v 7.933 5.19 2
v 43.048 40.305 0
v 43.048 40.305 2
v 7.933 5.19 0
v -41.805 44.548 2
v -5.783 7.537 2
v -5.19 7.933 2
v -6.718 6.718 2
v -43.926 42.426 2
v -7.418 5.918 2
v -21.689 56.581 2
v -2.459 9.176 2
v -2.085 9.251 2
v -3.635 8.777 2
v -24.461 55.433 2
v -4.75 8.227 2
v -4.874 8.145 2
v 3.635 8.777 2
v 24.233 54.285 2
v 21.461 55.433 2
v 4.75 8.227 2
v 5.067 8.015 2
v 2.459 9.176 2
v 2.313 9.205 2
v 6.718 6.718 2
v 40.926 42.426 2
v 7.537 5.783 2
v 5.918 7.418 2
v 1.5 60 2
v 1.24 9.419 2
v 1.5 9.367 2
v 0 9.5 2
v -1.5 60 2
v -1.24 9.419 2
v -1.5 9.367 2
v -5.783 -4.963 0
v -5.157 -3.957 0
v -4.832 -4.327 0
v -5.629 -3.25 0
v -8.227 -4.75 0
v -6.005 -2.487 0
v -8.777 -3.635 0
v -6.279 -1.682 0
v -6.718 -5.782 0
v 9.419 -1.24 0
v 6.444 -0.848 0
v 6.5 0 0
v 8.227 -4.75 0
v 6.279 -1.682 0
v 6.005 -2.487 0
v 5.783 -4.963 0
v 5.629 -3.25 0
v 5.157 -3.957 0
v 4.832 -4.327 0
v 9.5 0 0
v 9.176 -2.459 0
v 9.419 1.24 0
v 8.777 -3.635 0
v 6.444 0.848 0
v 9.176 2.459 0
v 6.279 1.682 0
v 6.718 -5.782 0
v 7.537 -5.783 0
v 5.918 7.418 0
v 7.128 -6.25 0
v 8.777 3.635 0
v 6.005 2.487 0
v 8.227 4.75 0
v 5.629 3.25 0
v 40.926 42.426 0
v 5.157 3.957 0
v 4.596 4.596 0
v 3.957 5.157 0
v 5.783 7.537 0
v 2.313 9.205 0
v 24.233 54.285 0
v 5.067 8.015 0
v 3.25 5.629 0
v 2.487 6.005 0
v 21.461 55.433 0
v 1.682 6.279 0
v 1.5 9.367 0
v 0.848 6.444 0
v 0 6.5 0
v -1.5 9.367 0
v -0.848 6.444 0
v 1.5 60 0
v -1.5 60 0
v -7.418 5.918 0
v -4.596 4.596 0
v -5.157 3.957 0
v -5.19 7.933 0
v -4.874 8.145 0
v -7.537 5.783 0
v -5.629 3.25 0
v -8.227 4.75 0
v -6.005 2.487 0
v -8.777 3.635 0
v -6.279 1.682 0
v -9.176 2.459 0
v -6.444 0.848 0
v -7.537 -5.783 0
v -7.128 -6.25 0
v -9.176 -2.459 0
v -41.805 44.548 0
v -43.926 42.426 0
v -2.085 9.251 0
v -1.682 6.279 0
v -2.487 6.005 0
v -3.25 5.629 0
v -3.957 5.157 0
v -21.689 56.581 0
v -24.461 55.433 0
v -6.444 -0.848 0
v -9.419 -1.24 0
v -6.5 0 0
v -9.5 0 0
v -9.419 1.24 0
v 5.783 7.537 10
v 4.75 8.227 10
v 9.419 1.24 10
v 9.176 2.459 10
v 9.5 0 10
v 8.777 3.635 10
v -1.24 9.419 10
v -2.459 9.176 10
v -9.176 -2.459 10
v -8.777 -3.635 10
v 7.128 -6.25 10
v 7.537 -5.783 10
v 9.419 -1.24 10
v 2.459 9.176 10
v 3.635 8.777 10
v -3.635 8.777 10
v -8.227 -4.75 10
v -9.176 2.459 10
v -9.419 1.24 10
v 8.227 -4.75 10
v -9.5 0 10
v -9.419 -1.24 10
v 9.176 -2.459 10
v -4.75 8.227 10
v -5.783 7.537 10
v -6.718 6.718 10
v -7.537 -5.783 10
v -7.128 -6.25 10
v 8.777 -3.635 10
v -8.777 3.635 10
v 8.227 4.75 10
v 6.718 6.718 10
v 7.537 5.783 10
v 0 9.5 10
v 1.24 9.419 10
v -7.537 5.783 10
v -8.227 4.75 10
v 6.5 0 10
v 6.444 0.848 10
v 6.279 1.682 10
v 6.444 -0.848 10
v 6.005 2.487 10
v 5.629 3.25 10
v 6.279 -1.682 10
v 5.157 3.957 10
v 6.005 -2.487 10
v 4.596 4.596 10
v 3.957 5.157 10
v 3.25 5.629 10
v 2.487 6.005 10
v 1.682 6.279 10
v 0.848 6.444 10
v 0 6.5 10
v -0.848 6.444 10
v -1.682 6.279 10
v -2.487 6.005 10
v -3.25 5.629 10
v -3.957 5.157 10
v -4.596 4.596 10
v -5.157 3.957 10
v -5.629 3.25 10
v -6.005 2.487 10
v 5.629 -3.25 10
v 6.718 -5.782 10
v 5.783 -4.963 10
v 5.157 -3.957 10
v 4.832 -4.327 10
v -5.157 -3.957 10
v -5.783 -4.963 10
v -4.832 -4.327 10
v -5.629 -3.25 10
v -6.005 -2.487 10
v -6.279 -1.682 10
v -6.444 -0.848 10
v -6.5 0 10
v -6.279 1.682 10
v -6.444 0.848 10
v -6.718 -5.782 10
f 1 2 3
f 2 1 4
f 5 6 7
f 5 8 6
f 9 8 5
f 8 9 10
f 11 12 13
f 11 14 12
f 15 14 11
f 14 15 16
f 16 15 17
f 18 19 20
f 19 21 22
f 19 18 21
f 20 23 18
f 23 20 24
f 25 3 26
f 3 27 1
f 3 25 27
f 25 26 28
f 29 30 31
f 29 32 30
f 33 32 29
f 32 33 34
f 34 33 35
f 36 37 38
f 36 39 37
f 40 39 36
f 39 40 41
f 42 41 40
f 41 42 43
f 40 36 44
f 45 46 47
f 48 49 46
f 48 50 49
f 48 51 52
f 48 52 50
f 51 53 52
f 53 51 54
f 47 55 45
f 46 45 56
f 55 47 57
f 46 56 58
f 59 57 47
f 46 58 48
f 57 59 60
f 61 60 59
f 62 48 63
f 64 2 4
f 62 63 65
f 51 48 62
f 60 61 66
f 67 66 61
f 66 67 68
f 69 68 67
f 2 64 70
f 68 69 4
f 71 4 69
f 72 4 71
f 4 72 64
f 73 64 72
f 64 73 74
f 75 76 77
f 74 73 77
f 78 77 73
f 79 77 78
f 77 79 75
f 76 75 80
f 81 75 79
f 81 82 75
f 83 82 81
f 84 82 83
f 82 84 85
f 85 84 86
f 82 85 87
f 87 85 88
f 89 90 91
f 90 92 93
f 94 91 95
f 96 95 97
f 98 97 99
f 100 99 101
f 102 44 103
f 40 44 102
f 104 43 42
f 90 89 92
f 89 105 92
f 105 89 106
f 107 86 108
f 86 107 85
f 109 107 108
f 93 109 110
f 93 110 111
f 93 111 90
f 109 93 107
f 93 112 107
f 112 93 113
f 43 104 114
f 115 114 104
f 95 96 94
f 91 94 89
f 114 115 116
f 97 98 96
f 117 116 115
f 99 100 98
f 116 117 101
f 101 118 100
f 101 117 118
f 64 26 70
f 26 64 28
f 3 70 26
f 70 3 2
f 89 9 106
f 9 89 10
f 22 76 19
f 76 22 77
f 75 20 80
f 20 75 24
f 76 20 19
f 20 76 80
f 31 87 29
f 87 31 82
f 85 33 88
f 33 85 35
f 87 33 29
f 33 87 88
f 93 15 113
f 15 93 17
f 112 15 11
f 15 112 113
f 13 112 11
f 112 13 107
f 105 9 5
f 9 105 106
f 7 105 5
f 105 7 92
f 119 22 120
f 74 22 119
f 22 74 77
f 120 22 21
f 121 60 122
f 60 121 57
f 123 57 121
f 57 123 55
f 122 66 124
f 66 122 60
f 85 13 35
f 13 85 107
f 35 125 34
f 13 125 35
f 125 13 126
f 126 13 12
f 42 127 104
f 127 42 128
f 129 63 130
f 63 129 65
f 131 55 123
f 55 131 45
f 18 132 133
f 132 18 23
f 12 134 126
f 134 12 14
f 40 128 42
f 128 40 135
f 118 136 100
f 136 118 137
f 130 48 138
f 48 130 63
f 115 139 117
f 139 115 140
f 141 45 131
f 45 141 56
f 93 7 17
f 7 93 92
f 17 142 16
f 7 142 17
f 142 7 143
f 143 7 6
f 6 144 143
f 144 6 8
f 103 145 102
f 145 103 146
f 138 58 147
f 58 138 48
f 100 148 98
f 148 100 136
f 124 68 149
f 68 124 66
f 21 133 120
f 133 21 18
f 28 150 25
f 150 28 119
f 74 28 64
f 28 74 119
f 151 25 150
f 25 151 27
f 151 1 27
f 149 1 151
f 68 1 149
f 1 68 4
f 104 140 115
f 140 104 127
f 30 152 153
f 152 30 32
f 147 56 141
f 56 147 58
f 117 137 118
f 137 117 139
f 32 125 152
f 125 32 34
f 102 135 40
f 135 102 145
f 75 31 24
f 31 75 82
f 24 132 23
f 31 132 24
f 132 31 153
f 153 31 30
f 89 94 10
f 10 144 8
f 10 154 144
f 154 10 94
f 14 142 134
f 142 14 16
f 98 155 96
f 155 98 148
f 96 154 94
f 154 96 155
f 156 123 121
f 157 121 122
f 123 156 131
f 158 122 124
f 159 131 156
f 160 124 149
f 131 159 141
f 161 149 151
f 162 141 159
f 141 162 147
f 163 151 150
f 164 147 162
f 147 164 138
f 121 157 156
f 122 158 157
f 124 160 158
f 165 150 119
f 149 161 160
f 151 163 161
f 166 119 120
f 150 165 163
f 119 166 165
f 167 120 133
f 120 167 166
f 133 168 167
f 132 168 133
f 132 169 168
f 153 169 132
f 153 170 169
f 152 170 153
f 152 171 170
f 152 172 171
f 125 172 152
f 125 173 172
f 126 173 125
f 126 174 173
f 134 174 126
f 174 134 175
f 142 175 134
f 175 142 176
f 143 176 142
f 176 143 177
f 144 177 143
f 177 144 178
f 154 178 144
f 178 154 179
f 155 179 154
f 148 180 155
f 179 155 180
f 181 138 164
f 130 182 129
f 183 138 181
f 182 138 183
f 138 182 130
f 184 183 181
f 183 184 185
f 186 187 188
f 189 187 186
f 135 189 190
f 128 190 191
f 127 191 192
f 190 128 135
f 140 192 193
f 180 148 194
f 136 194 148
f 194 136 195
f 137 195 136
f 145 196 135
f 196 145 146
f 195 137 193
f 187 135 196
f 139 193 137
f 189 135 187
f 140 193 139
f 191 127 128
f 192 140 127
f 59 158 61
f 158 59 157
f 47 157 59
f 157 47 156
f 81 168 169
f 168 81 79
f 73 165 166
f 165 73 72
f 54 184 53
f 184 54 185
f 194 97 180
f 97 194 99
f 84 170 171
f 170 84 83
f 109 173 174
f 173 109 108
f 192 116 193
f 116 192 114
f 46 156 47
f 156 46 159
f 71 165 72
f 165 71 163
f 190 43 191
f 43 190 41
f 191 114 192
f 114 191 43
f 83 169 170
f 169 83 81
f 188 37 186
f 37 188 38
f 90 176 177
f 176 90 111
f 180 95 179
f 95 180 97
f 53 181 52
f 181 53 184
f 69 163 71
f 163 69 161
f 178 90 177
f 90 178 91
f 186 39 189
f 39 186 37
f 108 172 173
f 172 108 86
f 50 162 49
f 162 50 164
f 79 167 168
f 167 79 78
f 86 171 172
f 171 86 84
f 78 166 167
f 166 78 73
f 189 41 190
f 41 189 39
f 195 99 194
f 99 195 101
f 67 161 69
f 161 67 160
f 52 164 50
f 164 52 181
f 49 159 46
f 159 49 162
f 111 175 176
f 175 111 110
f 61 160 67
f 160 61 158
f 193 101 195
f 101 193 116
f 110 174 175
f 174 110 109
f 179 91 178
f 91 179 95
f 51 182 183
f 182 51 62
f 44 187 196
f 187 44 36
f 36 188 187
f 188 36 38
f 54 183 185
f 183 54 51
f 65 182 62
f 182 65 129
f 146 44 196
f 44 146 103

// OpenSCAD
spike_l = 60; // spike length
spike_h = 2;  // spike height
spike_w = 3;  // spike width

pole_dia = 13;  // diameter of the pole
pole_thick = 3; // thickness of the clip
pole_h = 10;    // height of the clip

$fn = 48;

pole_r = pole_dia/2;

difference (){

  union(){
    translate([0-(spike_w/2), 0, 0]){

      rotate(a=-45, v=[0,0,1])
        cube([spike_w, spike_l, spike_h], center=false);

      rotate(a=-22.5, v=[0,0,1])
        cube([spike_w, spike_l, spike_h], center=false);

      cube([spike_w, spike_l, spike_h], center=false);

      rotate(a=22.5, v=[0,0,1])
        cube([spike_w, spike_l, spike_h], center=false);

      rotate(a=45, v=[0,0,1])
        cube([spike_w, spike_l, spike_h], center=false);
    }

    cylinder(r=pole_r+pole_thick, h=pole_h);
  }

  translate([0, 0, 0-(pole_h*0.1) ]){
    cylinder(r=pole_r, h=pole_h*1.2);

    translate([0, 0-pole_r-(pole_thick*2), 0])
      cylinder(r=pole_r+pole_thick, h=pole_h*1.2);
  }
}
